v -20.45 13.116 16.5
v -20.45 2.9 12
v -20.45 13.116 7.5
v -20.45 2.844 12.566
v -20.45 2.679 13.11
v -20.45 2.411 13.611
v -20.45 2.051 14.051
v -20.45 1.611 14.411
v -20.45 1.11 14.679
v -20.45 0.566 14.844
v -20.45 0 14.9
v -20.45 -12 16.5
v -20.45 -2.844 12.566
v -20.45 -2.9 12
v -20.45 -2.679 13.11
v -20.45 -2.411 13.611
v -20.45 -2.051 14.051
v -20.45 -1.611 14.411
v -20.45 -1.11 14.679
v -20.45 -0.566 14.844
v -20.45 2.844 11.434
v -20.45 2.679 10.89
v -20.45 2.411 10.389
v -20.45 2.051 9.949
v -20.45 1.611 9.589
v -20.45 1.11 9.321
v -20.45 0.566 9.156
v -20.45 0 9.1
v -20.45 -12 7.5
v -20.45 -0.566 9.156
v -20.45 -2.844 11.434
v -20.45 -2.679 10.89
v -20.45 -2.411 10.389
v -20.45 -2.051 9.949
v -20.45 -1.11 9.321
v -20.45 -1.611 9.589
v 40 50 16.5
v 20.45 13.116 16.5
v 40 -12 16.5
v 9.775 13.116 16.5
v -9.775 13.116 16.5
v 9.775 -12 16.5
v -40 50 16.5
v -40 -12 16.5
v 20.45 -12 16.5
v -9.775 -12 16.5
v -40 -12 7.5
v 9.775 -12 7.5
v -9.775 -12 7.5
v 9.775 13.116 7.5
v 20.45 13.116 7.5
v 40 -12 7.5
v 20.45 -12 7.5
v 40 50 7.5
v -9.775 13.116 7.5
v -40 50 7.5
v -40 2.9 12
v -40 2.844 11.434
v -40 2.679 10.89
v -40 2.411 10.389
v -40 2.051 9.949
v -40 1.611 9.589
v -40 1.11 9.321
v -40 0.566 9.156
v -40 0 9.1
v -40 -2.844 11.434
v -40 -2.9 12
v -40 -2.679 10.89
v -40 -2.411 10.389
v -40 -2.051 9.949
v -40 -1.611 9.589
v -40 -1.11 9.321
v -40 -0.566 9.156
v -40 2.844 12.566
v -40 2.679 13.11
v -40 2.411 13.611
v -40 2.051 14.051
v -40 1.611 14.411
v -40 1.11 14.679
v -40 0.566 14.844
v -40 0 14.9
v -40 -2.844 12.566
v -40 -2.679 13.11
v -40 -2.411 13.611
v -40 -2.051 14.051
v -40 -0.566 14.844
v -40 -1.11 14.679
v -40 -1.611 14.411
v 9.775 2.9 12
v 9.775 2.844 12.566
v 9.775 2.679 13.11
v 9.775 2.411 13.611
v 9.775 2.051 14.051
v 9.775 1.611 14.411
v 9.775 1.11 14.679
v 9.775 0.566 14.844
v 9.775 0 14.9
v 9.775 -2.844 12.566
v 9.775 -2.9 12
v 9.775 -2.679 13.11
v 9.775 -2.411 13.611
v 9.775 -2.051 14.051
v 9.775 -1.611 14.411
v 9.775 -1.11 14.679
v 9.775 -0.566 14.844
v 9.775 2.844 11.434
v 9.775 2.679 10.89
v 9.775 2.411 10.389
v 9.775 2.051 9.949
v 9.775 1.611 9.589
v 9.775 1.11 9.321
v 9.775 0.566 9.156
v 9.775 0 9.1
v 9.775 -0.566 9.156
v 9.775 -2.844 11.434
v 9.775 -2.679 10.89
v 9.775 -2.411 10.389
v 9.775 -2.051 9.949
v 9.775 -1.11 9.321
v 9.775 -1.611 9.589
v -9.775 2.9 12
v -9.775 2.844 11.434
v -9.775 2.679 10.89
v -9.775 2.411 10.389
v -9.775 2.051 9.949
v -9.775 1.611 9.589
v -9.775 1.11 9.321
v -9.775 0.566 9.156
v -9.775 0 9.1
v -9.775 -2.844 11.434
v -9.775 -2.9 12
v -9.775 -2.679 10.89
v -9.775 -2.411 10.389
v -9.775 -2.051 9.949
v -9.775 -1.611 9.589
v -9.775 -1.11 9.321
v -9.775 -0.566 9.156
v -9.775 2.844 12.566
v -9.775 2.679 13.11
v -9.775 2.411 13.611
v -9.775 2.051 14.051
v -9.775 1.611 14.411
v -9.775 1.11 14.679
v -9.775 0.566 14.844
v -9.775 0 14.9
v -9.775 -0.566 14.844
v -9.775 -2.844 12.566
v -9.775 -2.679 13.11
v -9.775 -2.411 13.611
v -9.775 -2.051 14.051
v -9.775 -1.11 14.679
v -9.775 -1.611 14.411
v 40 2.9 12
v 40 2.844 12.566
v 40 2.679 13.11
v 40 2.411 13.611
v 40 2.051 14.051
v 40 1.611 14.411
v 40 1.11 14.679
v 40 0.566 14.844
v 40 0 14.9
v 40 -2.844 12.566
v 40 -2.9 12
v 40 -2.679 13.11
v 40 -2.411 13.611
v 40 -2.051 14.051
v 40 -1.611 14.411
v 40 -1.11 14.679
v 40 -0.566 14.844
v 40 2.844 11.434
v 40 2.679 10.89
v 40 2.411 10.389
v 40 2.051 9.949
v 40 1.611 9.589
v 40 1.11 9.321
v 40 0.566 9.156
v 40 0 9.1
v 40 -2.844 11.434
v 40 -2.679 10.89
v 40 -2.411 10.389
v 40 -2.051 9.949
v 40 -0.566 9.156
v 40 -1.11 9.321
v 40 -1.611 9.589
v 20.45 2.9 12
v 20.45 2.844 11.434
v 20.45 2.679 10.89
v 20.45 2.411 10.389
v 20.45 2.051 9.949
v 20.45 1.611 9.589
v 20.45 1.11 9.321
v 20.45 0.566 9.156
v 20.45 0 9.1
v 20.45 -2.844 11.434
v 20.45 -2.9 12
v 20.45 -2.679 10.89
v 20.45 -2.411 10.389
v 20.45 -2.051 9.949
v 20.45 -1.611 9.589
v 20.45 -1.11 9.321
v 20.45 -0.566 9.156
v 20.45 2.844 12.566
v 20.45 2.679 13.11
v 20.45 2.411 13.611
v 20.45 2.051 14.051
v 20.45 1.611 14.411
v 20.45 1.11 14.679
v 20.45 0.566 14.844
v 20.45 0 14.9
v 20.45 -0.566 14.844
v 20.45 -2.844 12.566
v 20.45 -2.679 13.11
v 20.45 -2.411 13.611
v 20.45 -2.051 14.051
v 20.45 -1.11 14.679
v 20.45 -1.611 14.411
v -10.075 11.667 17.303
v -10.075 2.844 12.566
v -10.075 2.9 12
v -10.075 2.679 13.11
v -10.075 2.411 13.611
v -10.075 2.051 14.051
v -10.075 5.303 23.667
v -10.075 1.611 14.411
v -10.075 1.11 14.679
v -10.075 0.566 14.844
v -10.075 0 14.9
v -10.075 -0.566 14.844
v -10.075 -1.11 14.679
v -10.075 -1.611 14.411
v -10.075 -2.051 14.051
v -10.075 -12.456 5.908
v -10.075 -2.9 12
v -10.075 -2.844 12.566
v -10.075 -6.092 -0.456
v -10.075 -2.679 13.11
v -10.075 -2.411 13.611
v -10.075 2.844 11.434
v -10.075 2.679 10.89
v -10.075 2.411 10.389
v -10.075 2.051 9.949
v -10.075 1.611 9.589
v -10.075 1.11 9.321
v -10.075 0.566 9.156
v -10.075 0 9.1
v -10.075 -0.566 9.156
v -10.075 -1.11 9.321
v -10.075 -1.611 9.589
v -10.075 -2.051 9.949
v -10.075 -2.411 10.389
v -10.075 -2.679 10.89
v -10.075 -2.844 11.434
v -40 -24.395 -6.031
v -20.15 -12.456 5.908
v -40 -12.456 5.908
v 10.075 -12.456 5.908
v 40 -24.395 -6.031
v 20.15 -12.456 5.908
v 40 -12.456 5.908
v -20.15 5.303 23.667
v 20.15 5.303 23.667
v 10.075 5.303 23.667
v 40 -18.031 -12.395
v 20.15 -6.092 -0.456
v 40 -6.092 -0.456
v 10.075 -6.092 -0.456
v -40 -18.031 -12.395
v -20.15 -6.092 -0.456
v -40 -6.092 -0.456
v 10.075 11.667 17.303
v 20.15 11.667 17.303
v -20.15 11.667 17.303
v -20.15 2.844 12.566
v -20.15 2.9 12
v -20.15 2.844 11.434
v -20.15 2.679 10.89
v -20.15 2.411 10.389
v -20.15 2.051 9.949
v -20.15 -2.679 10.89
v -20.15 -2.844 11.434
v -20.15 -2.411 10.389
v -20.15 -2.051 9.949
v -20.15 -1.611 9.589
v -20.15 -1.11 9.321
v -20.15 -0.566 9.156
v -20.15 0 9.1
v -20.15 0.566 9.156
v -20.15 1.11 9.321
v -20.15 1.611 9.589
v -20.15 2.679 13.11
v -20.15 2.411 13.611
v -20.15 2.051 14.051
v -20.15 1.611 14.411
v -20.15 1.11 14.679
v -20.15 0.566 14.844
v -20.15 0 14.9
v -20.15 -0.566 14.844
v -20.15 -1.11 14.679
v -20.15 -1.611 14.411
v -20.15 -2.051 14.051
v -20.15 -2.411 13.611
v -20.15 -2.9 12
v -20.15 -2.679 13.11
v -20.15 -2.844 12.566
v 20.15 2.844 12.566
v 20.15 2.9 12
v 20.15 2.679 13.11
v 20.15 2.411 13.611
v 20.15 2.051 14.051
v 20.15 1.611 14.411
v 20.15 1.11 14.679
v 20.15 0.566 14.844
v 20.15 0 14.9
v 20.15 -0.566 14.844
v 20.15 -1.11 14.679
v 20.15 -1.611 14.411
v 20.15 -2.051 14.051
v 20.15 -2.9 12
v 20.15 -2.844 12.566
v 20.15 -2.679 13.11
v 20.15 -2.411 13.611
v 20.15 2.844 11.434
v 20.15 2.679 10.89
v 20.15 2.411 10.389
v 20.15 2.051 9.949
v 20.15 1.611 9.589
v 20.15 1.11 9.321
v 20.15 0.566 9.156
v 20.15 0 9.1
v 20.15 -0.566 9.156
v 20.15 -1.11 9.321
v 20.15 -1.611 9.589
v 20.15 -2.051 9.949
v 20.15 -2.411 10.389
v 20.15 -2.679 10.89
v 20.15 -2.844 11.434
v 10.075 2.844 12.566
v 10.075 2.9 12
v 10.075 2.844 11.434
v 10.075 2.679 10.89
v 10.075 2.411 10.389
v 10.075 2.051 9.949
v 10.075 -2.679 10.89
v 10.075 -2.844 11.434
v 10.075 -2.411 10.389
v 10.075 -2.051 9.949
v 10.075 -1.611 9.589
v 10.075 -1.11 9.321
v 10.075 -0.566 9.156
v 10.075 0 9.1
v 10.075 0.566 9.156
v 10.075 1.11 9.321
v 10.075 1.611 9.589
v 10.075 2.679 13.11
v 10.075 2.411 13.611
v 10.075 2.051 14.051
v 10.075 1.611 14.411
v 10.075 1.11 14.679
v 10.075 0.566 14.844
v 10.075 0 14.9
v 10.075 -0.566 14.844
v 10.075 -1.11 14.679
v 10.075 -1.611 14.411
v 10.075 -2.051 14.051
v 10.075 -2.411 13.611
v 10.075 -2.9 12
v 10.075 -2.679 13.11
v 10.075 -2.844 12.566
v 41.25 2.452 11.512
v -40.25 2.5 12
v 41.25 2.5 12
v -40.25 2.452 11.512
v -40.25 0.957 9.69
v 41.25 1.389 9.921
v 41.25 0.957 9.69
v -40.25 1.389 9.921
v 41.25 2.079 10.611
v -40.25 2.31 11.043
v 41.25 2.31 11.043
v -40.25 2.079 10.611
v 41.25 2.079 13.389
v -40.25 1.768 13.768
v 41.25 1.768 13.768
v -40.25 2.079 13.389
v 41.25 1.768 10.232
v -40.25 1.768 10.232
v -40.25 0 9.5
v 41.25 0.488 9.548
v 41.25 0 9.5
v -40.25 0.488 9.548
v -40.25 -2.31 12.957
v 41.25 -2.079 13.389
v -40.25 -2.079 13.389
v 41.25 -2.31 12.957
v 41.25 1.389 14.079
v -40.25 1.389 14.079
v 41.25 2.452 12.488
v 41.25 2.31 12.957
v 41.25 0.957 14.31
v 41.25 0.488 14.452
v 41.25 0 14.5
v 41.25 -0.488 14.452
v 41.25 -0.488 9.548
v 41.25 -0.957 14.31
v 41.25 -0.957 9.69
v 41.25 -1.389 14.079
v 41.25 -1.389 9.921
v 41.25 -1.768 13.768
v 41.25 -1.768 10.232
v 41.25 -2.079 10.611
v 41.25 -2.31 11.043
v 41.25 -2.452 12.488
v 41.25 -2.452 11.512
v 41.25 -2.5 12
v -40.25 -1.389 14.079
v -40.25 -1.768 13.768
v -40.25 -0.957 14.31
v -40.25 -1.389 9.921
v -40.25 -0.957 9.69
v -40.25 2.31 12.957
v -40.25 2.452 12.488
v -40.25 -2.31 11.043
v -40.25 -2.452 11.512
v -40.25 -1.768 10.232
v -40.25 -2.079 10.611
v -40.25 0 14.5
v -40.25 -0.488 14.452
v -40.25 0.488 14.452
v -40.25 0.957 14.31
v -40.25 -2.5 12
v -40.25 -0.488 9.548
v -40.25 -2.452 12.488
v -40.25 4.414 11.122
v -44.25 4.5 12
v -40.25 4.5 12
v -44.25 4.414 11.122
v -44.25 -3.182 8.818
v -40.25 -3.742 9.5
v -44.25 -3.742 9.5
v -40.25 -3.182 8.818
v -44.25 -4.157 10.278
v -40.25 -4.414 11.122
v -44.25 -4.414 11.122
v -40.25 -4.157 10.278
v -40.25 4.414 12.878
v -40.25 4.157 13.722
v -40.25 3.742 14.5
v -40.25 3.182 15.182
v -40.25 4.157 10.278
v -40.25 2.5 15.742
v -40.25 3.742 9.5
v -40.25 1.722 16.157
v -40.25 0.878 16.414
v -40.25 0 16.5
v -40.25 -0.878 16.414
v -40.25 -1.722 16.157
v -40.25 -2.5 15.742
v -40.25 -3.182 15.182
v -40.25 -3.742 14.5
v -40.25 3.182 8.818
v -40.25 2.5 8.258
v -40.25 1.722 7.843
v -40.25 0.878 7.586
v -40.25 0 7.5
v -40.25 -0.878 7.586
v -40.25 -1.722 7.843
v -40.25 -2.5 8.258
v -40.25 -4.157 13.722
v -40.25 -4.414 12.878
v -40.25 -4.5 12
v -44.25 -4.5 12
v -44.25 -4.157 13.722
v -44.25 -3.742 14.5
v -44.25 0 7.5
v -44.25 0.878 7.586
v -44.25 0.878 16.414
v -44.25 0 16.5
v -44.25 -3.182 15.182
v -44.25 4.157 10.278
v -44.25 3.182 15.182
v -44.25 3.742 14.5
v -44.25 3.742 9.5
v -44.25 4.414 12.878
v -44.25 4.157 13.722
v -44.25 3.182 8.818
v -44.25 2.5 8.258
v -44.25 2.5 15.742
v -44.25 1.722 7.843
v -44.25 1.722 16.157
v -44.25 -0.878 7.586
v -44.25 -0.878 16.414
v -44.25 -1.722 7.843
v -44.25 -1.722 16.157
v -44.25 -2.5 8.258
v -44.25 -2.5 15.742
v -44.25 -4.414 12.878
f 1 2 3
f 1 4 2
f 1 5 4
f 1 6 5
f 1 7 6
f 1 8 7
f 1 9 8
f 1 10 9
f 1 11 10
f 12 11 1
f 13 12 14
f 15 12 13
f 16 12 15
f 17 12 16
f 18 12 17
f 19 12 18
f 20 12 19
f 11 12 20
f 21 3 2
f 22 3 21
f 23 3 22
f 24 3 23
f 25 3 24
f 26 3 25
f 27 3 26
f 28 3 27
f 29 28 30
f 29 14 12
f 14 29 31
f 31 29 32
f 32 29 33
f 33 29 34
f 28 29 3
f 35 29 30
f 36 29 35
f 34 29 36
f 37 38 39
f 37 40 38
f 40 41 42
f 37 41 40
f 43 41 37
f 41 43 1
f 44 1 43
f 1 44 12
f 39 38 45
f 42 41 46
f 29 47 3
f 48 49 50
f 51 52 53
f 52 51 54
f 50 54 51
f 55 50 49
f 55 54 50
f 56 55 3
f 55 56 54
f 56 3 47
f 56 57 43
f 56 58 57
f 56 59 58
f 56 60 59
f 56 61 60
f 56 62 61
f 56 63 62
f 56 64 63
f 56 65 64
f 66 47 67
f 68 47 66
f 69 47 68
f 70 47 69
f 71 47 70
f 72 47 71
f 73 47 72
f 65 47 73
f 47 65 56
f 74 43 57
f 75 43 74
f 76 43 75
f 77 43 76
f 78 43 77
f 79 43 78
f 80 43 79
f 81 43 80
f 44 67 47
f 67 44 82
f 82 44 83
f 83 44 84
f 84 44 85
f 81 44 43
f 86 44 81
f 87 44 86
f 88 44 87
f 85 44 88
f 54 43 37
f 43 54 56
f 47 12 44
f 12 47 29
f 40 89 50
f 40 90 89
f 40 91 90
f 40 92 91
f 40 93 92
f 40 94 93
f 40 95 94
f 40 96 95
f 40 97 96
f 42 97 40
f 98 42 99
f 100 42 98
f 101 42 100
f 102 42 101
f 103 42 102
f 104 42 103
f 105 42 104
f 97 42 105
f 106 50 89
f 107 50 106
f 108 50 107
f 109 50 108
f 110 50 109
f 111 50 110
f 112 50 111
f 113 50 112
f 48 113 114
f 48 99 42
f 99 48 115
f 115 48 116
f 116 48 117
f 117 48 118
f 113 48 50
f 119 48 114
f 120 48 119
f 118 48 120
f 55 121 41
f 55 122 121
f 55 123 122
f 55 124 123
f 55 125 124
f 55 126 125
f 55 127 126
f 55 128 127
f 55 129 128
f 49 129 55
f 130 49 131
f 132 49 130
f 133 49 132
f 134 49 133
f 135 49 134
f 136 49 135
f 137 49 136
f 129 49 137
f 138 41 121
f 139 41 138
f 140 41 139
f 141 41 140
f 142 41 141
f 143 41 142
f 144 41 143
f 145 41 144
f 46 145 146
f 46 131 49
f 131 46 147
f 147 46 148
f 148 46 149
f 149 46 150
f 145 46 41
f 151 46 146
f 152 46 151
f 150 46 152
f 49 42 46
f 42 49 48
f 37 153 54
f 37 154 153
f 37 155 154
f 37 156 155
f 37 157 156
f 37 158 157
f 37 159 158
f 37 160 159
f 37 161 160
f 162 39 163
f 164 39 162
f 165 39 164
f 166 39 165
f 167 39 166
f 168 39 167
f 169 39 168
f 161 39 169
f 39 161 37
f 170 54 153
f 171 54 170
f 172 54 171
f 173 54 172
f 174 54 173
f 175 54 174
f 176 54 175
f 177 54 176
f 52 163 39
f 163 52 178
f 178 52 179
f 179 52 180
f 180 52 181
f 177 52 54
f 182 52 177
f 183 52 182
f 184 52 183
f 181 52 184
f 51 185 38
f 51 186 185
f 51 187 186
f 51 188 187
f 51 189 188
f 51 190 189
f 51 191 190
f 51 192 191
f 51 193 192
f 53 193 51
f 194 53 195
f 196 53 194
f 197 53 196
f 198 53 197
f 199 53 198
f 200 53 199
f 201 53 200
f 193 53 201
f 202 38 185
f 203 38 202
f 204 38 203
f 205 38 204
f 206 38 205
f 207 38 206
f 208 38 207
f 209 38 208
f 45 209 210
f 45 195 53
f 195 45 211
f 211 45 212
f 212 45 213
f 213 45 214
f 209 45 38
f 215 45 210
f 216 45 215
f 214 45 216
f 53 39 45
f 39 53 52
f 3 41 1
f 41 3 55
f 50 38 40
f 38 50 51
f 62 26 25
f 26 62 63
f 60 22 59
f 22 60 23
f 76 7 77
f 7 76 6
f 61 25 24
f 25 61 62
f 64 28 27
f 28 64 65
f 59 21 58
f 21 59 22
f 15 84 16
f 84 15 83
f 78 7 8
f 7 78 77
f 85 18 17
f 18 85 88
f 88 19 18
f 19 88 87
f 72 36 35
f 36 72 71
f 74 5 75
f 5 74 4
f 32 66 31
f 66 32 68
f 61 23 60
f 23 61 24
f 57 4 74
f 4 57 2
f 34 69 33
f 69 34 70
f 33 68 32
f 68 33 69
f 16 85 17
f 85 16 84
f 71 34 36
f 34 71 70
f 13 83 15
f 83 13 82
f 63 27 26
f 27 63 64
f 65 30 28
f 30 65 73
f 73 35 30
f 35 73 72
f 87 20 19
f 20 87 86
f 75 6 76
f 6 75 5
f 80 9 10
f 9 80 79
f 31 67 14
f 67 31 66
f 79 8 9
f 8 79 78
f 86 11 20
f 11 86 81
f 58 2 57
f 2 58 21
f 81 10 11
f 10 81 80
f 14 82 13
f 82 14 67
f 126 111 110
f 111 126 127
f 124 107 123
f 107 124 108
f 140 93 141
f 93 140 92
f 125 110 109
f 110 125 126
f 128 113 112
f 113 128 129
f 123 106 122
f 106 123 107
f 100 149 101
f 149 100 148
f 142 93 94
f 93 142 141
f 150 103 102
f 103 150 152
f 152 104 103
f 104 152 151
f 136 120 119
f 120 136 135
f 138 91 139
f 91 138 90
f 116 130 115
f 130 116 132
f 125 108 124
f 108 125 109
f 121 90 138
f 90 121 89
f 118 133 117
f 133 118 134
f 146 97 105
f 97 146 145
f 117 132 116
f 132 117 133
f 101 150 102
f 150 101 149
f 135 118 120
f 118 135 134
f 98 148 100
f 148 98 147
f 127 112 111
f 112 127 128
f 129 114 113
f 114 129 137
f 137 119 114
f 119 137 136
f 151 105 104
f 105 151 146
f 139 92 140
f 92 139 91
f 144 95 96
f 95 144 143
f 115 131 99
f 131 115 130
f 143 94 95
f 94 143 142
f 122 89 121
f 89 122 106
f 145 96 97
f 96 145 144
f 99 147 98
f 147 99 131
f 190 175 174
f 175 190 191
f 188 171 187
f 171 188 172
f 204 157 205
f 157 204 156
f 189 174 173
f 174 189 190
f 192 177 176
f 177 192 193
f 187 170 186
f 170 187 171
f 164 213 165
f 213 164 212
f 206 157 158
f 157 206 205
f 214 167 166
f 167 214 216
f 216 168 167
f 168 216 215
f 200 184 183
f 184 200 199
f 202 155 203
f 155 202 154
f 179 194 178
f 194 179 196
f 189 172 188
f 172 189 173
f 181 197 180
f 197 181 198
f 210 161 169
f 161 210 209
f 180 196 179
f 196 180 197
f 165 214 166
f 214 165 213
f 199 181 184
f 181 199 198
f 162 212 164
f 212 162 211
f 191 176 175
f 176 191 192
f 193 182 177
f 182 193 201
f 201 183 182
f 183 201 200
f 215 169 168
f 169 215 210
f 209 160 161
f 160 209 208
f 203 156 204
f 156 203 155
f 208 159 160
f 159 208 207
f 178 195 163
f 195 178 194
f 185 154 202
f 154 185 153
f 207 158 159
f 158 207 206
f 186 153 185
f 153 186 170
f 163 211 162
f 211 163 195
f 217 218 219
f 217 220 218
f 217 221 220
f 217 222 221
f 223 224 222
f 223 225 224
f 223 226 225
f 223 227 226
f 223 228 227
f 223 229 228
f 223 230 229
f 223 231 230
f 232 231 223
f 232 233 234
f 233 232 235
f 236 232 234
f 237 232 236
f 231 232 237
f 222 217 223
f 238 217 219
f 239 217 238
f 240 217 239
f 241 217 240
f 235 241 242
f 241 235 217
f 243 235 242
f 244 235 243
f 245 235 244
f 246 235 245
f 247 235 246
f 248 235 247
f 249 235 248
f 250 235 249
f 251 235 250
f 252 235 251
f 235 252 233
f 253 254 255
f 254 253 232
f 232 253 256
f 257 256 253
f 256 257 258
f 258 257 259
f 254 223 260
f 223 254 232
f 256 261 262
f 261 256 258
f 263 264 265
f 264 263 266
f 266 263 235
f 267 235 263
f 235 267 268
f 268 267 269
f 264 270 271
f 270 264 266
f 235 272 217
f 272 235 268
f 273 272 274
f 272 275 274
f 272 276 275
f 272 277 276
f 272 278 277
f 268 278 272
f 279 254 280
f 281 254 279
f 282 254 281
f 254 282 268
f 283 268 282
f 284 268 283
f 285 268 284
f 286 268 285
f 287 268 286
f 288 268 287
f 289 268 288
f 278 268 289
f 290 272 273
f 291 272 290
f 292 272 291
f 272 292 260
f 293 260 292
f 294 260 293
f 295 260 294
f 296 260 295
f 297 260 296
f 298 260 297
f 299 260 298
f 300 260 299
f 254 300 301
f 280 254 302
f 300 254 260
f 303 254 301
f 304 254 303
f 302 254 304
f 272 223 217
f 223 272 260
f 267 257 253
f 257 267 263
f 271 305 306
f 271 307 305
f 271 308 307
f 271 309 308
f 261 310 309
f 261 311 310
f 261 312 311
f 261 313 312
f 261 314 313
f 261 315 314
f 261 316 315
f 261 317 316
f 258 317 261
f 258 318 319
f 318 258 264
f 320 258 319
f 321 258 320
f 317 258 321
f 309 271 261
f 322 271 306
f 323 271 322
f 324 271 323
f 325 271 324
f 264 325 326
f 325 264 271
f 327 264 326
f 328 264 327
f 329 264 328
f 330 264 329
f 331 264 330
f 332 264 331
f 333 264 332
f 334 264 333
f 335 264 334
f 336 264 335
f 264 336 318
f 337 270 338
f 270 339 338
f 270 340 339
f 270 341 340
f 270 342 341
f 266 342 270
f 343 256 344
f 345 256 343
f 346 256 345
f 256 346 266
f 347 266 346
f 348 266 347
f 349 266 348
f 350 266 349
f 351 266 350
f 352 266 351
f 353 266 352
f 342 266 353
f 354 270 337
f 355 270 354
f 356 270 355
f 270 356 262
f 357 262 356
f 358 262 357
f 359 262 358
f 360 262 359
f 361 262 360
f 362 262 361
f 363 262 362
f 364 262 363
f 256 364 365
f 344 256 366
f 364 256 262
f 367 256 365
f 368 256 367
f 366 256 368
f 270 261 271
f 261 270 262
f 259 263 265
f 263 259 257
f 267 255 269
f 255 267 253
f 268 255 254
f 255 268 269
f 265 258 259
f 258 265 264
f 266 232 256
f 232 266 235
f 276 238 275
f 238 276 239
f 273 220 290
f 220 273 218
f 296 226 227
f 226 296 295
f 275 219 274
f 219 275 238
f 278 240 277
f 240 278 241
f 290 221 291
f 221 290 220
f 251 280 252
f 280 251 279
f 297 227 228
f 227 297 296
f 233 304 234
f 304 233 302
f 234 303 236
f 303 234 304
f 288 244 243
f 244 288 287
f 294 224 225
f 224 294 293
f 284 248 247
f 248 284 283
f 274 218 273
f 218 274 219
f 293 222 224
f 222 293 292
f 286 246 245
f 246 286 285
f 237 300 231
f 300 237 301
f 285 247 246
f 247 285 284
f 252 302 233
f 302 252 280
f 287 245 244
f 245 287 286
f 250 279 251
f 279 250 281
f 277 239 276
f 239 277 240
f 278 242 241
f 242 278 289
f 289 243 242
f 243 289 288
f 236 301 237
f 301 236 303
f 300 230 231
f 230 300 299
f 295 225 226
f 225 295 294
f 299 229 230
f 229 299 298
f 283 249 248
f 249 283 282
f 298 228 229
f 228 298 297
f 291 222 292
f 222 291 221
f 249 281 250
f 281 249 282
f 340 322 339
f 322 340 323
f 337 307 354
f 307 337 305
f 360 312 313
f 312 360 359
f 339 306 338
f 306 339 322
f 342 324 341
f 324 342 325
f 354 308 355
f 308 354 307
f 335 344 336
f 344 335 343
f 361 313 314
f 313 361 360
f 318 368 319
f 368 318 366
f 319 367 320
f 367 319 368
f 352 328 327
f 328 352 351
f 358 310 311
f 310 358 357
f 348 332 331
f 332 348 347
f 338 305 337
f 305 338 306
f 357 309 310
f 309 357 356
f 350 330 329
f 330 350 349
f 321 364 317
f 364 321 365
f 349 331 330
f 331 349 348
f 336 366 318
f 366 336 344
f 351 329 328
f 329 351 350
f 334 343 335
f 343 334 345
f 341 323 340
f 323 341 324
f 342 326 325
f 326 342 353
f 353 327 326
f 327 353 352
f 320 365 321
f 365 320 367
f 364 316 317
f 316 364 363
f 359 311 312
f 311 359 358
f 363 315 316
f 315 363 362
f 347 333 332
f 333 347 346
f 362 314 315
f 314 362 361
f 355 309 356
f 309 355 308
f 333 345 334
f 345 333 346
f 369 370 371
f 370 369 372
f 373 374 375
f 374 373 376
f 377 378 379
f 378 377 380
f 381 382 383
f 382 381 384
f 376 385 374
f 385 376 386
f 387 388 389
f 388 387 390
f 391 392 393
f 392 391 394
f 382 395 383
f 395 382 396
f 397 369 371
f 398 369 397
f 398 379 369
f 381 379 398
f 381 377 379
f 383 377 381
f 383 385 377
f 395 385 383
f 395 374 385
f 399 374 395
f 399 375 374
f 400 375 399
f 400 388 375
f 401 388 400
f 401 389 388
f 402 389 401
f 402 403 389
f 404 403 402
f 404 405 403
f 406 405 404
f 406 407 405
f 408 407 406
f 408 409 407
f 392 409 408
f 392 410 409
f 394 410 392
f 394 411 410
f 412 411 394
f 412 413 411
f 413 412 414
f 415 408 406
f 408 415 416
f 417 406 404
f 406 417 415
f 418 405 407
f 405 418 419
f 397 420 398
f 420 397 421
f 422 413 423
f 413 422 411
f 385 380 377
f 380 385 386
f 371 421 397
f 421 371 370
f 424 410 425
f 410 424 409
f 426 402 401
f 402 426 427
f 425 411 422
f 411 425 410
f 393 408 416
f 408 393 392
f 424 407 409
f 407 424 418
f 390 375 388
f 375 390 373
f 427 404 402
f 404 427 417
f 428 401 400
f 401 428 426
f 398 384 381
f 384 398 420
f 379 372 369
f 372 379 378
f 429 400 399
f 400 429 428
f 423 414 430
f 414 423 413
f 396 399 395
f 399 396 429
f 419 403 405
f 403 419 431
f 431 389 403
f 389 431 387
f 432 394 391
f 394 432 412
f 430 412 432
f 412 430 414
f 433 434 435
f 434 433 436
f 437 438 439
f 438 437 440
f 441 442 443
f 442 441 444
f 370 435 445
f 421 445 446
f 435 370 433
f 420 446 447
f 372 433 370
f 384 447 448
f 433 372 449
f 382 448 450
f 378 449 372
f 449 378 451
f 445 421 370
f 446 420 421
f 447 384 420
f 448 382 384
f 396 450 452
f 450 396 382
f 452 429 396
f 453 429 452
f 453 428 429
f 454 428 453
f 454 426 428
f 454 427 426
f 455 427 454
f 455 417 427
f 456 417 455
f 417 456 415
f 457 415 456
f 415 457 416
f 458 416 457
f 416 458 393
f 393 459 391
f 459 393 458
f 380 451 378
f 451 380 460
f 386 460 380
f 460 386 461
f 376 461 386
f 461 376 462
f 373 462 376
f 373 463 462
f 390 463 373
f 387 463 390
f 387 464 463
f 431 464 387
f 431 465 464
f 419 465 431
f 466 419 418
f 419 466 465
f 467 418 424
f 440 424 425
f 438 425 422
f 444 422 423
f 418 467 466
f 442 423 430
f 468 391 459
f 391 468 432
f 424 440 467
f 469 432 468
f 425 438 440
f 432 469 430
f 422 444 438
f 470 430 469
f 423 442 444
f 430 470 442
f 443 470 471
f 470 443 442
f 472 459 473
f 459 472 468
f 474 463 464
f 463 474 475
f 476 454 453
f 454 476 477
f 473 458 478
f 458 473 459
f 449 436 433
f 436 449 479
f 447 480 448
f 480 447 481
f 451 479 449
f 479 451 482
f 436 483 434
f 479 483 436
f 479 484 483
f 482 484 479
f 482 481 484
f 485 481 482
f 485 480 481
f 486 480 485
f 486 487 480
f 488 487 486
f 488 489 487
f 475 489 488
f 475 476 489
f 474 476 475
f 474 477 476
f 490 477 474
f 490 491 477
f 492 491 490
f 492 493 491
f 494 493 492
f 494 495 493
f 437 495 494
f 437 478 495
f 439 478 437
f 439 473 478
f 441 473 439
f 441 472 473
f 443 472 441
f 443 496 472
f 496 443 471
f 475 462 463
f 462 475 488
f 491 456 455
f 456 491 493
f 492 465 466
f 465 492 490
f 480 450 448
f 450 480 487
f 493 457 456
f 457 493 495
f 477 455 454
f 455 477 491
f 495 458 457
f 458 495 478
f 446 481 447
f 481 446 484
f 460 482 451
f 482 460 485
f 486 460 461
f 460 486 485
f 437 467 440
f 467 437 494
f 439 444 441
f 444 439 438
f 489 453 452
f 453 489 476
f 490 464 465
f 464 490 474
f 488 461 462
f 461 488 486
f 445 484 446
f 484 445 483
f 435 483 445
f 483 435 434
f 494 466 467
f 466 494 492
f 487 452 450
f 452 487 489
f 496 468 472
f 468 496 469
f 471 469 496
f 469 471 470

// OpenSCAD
$fn = 32;

// ------------------------------------------------------------------------
// Butt hinge: hinge 80 mm, leaf swung 45 deg
// Every part is its own module, assembly() places every instance.
// ------------------------------------------------------------------------

// --- part 1 ---
module hinge_base() {
  difference() {
    union() {
      translate([-40, -12, -4.5]) cube([19.55, 62, 9]);
      translate([-9.775, -12, -4.5]) cube([19.55, 62, 9]);
      translate([20.45, -12, -4.5]) cube([19.55, 62, 9]);
      translate([-40, 13.116, -4.5]) cube([80, 36.884, 9]);
    }
    translate([-30.225, 0, 0]) rotate([0, 90, 0]) cylinder(h = 21.55, d = 5.8, center = true);
    translate([0, 0, 0]) rotate([0, 90, 0]) cylinder(h = 21.55, d = 5.8, center = true);
    translate([30.225, 0, 0]) rotate([0, 90, 0]) cylinder(h = 21.55, d = 5.8, center = true);
  }
}

// --- part 2 ---
module hinge_mover() {
  difference() {
    union() {
      translate([-20.15, -30, -4.5]) cube([10.075, 42, 9]);
      translate([10.075, -30, -4.5]) cube([10.075, 42, 9]);
      translate([-40, -30, -4.5]) cube([80, 16.884, 9]);
    }
    translate([-15.113, 0, 0]) rotate([0, 90, 0]) cylinder(h = 12.075, d = 5.8, center = true);
    translate([15.113, 0, 0]) rotate([0, 90, 0]) cylinder(h = 12.075, d = 5.8, center = true);
  }
}

// --- part 3 ---
module hinge_pin() {
  rotate([0, 90, 0]) cylinder(h = 82.5, d = 5, center = true);
  translate([-44.25, 0, 0]) rotate([0, 90, 0]) cylinder(h = 4, d = 9);
}

// --- assembly ---
module assembly() {
  color([0.80, 0.24, 0.20]) translate([0, 0, 12]) rotate([0, 0, 0]) hinge_base();
  color([0.20, 0.45, 0.75]) translate([0, 0, 12]) rotate([45, 0, 0]) hinge_mover();
  color([0.25, 0.62, 0.32]) translate([0, 0, 12]) rotate([0, 0, 0]) hinge_pin();
}

assembly();
